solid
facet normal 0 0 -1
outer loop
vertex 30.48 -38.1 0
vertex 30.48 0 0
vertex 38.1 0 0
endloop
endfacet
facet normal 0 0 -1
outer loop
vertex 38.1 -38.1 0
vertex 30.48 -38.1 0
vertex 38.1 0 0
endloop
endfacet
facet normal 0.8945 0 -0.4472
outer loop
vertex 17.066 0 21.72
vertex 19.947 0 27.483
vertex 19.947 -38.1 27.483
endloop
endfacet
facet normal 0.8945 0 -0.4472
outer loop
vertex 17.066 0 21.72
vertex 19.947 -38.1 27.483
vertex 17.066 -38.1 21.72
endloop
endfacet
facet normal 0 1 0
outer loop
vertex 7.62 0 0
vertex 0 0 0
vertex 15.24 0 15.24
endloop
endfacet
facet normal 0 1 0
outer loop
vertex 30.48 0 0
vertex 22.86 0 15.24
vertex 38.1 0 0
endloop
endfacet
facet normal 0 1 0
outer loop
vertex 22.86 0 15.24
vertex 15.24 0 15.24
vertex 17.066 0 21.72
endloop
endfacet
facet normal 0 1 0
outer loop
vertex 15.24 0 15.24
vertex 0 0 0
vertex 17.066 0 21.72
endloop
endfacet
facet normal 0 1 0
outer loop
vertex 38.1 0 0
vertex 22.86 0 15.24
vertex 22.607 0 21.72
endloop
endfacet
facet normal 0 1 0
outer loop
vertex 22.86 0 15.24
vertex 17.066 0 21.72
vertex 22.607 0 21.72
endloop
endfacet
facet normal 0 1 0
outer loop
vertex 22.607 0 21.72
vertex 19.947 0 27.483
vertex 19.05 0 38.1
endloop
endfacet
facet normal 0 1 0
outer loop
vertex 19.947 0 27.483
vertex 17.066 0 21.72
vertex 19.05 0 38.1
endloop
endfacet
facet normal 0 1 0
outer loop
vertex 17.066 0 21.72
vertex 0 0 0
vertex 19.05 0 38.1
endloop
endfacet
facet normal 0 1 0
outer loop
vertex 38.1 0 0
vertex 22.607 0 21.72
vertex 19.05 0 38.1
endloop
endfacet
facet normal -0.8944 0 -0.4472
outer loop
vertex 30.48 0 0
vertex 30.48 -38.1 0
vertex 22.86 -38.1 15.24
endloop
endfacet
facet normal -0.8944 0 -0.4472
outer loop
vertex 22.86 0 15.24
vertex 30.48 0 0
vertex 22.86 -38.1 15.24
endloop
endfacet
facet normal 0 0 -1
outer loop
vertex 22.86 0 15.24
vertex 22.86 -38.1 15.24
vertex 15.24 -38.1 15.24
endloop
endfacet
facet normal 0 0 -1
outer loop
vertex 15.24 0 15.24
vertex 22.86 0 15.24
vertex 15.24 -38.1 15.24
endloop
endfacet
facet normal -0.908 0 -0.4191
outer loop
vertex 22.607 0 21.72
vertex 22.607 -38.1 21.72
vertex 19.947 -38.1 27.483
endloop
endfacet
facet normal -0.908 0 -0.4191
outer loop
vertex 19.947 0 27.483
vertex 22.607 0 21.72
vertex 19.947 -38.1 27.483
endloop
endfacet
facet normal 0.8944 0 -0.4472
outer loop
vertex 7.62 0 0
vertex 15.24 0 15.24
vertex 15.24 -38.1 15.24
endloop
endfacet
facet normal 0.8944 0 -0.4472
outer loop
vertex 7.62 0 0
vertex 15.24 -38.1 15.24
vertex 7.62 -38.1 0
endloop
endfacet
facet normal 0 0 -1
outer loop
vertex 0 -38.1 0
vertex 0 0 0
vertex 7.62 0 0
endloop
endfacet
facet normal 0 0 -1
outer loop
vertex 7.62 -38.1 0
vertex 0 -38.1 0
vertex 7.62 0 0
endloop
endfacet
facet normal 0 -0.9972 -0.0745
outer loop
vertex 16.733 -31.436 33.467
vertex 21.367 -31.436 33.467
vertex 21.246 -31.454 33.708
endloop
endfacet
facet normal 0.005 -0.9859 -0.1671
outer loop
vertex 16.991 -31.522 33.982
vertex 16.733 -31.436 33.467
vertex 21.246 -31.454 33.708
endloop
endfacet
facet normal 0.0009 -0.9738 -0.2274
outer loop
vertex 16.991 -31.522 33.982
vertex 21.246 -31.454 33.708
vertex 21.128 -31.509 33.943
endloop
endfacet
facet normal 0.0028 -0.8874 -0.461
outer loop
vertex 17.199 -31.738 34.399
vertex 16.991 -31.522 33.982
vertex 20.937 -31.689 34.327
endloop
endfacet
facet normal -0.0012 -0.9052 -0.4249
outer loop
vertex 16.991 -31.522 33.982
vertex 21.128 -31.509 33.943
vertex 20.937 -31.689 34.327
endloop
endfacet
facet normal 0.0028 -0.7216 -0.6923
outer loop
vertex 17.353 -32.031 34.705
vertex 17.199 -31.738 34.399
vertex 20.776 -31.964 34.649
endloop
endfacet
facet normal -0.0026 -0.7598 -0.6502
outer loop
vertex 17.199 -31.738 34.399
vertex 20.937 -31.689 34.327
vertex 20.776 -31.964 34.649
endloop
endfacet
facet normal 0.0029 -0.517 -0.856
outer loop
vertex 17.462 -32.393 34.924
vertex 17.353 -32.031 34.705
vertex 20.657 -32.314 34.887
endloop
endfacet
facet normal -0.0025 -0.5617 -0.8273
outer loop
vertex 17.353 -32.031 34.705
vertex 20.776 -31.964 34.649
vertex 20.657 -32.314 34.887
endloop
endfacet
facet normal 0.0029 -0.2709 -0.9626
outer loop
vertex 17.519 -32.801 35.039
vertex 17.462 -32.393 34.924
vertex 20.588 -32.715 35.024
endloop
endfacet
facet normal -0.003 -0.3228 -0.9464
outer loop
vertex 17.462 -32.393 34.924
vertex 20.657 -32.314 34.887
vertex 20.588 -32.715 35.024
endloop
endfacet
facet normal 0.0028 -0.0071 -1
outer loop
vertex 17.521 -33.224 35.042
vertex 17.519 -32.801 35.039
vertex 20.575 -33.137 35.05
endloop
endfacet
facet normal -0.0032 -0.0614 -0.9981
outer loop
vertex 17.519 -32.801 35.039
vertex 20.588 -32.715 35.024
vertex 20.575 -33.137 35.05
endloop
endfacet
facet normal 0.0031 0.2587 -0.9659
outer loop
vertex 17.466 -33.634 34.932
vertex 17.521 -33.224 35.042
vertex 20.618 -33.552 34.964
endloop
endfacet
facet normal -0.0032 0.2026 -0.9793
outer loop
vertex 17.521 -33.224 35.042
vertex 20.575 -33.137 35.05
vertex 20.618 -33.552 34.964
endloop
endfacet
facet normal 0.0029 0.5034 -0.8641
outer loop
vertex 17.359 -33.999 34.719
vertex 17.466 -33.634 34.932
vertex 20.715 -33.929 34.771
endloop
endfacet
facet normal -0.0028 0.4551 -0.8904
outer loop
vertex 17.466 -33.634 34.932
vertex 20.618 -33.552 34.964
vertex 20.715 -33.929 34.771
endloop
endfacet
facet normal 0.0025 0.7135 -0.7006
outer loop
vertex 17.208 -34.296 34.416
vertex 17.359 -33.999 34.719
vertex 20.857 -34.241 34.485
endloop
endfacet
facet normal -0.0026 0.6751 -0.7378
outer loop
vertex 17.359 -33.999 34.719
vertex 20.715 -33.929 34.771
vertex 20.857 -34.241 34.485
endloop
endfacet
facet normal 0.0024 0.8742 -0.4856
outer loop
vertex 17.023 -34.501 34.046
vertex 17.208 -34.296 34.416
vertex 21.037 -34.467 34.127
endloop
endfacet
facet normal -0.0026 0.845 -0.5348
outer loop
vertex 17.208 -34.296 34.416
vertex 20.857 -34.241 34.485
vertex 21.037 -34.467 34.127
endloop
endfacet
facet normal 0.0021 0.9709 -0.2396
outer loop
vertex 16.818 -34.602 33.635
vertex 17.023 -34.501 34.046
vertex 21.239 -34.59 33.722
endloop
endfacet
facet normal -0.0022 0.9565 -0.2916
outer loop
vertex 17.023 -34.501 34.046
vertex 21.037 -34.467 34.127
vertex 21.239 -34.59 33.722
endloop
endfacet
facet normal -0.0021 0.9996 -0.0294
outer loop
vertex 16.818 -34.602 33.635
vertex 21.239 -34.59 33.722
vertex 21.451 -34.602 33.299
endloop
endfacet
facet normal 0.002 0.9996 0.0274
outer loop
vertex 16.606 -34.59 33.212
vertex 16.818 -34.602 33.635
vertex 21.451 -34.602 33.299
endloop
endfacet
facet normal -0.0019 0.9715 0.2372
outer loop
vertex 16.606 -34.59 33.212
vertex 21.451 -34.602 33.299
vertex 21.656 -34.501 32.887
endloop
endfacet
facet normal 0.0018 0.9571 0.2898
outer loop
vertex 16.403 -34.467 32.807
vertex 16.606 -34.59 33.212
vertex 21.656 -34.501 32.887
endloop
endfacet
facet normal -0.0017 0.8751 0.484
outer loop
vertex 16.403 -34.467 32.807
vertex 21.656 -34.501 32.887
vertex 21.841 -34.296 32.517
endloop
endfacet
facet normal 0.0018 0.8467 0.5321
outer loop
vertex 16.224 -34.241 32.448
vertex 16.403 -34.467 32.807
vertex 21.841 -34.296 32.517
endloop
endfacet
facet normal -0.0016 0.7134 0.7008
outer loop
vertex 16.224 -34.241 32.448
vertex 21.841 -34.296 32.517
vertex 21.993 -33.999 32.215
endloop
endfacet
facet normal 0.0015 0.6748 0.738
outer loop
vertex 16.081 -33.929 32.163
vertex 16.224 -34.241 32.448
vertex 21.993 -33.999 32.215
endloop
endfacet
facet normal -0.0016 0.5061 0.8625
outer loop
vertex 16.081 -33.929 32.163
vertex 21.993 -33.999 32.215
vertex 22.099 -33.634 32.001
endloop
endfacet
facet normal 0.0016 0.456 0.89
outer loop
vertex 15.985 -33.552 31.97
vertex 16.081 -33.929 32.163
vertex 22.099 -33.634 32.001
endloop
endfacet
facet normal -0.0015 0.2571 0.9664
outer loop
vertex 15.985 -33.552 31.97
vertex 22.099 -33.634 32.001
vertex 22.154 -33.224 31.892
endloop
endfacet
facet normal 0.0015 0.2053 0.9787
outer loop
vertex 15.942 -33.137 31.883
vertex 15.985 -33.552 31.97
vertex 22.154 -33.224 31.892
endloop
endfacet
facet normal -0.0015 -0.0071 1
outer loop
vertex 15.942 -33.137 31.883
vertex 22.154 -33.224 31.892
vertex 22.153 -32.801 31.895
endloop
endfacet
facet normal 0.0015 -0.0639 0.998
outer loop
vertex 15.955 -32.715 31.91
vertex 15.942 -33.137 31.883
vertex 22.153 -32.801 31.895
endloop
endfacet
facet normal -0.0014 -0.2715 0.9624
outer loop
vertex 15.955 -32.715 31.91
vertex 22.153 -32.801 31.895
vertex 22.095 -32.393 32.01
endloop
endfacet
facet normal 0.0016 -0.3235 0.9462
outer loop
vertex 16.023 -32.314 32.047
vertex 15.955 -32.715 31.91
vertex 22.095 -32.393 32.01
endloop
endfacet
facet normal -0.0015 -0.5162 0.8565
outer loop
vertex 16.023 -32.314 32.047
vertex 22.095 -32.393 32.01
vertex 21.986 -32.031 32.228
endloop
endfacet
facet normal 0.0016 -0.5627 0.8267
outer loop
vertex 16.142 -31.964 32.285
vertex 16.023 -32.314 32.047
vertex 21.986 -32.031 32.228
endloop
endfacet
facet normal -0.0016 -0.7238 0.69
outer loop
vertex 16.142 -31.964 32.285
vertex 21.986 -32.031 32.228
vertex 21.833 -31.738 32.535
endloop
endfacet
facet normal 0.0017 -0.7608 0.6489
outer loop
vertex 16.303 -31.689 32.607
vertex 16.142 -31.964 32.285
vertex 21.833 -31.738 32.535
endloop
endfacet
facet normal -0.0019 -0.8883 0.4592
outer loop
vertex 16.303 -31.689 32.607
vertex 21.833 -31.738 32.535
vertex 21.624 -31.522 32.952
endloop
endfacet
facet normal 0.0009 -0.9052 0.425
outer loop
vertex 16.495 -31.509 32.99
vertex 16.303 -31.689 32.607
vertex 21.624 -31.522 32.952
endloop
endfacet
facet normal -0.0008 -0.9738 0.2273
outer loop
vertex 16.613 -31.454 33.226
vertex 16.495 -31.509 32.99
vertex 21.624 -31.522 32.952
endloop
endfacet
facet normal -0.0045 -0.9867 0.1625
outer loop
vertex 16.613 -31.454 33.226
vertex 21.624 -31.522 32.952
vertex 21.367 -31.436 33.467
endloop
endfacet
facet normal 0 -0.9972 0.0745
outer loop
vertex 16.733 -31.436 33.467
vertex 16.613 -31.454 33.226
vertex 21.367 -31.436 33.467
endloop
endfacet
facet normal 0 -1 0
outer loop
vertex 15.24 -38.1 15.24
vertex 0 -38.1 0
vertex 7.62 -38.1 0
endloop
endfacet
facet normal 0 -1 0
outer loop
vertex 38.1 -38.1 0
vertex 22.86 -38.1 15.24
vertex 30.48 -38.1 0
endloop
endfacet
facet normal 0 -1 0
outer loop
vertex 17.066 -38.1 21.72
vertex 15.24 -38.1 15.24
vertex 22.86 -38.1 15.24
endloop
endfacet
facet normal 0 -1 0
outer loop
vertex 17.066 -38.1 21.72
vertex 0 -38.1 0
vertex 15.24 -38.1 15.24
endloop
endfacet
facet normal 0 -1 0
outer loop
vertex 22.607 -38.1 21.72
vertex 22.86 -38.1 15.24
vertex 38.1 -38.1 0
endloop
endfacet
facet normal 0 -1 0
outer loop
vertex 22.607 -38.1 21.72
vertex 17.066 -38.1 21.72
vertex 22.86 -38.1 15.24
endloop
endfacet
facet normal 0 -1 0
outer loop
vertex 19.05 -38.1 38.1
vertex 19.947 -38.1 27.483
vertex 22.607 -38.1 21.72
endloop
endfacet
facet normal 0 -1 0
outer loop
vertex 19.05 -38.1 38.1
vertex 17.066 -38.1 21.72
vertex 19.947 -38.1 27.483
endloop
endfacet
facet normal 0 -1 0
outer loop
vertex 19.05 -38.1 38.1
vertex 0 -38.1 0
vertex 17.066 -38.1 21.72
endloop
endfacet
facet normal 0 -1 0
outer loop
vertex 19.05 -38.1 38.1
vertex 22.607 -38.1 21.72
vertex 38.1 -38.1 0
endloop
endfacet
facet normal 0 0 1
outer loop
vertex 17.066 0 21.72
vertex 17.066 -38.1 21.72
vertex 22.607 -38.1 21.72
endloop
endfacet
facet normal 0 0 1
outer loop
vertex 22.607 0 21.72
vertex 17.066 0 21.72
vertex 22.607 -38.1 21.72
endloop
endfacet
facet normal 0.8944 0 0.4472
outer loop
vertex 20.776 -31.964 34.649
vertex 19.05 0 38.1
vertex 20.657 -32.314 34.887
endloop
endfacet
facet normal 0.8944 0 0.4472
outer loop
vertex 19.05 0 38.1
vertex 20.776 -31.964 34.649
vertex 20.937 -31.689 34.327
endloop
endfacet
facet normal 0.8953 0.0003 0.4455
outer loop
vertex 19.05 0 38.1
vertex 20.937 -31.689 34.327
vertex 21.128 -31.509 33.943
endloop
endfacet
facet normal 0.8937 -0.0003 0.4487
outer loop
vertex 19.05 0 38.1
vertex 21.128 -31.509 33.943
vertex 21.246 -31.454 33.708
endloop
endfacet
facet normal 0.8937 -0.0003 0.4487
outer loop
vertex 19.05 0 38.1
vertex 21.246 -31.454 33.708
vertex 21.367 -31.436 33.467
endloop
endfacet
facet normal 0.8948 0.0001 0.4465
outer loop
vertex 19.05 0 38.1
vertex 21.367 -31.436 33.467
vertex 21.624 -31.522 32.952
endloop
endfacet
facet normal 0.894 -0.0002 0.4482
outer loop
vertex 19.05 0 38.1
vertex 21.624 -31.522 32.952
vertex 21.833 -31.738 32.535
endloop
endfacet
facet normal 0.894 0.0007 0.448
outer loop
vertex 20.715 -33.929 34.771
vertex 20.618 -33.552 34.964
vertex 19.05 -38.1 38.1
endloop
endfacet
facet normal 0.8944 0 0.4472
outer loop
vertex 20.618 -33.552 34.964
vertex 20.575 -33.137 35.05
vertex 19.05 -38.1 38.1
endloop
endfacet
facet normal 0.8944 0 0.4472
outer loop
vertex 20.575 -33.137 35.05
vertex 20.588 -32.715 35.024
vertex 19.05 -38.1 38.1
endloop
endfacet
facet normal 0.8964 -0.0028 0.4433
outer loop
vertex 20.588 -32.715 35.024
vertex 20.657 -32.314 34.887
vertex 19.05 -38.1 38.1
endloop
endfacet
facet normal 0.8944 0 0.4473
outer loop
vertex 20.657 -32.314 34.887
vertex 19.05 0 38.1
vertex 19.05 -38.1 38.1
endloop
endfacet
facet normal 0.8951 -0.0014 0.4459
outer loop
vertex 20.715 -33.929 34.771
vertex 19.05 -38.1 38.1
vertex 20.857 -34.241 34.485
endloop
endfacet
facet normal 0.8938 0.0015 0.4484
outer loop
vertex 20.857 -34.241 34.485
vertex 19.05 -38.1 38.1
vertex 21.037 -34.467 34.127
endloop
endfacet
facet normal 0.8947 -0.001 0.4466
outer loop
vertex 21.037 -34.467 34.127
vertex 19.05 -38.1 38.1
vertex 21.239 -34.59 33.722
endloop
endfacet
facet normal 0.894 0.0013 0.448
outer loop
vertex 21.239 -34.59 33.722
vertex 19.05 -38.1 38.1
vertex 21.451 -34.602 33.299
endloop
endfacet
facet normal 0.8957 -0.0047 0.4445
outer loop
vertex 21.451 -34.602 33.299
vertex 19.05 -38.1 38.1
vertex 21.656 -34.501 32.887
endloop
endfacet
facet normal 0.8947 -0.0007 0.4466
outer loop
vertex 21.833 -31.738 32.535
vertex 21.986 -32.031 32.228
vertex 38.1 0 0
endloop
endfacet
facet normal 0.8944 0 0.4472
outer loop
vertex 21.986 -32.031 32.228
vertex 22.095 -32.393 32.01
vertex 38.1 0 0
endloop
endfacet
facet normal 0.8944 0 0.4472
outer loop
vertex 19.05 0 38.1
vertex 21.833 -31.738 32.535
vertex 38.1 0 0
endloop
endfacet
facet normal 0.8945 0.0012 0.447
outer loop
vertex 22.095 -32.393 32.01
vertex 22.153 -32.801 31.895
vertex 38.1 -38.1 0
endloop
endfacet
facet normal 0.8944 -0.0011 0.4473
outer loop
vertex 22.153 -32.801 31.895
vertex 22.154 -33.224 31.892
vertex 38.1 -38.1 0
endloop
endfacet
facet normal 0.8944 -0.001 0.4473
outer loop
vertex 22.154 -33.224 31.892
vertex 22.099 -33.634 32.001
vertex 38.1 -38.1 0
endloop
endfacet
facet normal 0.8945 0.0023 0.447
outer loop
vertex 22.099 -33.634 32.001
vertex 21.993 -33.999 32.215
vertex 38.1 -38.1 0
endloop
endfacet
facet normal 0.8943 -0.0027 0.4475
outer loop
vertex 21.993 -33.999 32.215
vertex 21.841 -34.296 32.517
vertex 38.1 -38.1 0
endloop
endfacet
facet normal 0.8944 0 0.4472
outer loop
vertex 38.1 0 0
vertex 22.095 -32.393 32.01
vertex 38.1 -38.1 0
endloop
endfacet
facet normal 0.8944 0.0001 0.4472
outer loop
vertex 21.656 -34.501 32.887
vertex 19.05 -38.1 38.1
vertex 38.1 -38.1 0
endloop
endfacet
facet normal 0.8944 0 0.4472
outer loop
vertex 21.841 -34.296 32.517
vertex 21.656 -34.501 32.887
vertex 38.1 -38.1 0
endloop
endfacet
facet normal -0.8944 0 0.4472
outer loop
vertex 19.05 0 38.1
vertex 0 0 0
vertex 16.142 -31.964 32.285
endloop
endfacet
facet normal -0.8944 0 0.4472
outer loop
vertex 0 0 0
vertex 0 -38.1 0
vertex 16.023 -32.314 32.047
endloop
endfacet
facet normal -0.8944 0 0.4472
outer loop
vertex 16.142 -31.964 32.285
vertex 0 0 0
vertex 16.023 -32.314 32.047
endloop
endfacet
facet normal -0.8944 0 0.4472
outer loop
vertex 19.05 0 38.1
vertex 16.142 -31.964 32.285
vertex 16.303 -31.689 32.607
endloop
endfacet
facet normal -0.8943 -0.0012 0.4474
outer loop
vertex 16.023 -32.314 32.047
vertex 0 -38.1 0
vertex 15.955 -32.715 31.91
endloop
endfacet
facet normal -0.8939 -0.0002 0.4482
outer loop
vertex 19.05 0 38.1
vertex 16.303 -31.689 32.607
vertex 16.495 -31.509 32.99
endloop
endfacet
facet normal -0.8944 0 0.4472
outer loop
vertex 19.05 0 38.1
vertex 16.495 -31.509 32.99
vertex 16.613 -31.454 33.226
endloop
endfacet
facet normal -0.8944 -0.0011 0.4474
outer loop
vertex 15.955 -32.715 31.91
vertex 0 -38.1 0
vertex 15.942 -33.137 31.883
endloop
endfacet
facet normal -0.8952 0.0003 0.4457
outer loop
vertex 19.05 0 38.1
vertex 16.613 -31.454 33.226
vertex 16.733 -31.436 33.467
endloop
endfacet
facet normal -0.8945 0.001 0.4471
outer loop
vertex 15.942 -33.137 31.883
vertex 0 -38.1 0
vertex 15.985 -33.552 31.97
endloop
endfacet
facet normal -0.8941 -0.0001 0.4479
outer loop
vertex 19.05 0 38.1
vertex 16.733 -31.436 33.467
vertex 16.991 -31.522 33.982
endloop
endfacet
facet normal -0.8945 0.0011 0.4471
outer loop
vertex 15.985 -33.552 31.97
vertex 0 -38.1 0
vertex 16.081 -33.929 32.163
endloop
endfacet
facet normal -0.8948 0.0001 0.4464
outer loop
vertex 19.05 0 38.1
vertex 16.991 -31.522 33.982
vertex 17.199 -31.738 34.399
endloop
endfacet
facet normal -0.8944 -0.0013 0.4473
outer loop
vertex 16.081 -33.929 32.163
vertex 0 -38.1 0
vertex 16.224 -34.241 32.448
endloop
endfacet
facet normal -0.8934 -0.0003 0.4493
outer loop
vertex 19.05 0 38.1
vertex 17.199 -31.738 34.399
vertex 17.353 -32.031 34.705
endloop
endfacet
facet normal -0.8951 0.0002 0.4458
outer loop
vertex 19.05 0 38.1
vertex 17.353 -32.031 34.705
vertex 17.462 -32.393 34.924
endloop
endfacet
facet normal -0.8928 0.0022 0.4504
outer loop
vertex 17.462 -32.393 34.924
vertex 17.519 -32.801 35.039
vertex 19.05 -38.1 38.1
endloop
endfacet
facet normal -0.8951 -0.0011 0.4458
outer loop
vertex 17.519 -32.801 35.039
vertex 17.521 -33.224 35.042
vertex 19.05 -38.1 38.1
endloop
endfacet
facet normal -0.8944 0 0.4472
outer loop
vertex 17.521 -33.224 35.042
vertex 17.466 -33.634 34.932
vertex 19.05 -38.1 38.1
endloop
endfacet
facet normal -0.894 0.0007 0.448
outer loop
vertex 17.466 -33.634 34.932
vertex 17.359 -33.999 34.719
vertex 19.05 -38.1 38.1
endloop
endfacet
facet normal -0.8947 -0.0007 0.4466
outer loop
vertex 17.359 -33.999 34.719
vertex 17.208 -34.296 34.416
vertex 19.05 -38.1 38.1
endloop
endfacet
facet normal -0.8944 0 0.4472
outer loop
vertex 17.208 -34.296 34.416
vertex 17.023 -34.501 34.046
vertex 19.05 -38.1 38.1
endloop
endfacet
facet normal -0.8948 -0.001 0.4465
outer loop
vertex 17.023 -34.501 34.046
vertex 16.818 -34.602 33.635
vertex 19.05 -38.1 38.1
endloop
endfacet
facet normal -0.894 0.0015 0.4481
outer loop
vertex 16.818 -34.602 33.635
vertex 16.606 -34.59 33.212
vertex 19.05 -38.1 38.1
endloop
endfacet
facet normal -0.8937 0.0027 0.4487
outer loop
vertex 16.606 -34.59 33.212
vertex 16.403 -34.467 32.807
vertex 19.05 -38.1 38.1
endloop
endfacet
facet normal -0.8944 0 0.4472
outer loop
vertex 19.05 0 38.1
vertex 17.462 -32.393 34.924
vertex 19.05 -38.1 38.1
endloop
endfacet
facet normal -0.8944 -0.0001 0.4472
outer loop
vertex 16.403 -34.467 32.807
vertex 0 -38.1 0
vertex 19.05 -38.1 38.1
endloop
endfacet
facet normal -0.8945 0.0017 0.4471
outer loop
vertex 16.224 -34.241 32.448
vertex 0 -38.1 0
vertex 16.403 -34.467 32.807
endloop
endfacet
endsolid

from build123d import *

# Parameters (mm, degrees)
F0_W     = 38.1
F0_H     = 38.1
F1_DEPTH = 38.1
F5_DEPTH = 38.1
F6_R     = 1.5875
F7_DEPTH = 38.1


with BuildPart() as f1:
    # F0 (on Front) → F1 (new body)
    with BuildSketch(Plane.XZ):
        with Locations((19.05, 19.05)):
            Rectangle(F0_W, F0_H)
    extrude(amount=F1_DEPTH)

    # F4 (on offset) → F5 (cut)
    with BuildSketch(Plane.XZ.offset(38.1)):
        Polygon((19.05, 38.1), (0, 38.1), (0, 0), align=None)
        Polygon((22.606704, 21.720167), (19.947089, 27.482659), (17.065844, 21.720167), align=None)
        Polygon((15.24, 15.24), (7.62, 0), (30.48, 0), (22.86, 15.24), align=None)
        Polygon((38.1, 38.1), (19.05, 38.1), (38.1, 0), align=None)
    extrude(amount=-F5_DEPTH, mode=Mode.SUBTRACT)

    # F6 (on offset) → F7 (cut)
    with BuildSketch(Plane.YZ.offset(38.1)):
        with Locations((-33.023518, 33.466786)):
            Circle(F6_R)
    extrude(amount=-F7_DEPTH, mode=Mode.SUBTRACT)


solid = f1.part
